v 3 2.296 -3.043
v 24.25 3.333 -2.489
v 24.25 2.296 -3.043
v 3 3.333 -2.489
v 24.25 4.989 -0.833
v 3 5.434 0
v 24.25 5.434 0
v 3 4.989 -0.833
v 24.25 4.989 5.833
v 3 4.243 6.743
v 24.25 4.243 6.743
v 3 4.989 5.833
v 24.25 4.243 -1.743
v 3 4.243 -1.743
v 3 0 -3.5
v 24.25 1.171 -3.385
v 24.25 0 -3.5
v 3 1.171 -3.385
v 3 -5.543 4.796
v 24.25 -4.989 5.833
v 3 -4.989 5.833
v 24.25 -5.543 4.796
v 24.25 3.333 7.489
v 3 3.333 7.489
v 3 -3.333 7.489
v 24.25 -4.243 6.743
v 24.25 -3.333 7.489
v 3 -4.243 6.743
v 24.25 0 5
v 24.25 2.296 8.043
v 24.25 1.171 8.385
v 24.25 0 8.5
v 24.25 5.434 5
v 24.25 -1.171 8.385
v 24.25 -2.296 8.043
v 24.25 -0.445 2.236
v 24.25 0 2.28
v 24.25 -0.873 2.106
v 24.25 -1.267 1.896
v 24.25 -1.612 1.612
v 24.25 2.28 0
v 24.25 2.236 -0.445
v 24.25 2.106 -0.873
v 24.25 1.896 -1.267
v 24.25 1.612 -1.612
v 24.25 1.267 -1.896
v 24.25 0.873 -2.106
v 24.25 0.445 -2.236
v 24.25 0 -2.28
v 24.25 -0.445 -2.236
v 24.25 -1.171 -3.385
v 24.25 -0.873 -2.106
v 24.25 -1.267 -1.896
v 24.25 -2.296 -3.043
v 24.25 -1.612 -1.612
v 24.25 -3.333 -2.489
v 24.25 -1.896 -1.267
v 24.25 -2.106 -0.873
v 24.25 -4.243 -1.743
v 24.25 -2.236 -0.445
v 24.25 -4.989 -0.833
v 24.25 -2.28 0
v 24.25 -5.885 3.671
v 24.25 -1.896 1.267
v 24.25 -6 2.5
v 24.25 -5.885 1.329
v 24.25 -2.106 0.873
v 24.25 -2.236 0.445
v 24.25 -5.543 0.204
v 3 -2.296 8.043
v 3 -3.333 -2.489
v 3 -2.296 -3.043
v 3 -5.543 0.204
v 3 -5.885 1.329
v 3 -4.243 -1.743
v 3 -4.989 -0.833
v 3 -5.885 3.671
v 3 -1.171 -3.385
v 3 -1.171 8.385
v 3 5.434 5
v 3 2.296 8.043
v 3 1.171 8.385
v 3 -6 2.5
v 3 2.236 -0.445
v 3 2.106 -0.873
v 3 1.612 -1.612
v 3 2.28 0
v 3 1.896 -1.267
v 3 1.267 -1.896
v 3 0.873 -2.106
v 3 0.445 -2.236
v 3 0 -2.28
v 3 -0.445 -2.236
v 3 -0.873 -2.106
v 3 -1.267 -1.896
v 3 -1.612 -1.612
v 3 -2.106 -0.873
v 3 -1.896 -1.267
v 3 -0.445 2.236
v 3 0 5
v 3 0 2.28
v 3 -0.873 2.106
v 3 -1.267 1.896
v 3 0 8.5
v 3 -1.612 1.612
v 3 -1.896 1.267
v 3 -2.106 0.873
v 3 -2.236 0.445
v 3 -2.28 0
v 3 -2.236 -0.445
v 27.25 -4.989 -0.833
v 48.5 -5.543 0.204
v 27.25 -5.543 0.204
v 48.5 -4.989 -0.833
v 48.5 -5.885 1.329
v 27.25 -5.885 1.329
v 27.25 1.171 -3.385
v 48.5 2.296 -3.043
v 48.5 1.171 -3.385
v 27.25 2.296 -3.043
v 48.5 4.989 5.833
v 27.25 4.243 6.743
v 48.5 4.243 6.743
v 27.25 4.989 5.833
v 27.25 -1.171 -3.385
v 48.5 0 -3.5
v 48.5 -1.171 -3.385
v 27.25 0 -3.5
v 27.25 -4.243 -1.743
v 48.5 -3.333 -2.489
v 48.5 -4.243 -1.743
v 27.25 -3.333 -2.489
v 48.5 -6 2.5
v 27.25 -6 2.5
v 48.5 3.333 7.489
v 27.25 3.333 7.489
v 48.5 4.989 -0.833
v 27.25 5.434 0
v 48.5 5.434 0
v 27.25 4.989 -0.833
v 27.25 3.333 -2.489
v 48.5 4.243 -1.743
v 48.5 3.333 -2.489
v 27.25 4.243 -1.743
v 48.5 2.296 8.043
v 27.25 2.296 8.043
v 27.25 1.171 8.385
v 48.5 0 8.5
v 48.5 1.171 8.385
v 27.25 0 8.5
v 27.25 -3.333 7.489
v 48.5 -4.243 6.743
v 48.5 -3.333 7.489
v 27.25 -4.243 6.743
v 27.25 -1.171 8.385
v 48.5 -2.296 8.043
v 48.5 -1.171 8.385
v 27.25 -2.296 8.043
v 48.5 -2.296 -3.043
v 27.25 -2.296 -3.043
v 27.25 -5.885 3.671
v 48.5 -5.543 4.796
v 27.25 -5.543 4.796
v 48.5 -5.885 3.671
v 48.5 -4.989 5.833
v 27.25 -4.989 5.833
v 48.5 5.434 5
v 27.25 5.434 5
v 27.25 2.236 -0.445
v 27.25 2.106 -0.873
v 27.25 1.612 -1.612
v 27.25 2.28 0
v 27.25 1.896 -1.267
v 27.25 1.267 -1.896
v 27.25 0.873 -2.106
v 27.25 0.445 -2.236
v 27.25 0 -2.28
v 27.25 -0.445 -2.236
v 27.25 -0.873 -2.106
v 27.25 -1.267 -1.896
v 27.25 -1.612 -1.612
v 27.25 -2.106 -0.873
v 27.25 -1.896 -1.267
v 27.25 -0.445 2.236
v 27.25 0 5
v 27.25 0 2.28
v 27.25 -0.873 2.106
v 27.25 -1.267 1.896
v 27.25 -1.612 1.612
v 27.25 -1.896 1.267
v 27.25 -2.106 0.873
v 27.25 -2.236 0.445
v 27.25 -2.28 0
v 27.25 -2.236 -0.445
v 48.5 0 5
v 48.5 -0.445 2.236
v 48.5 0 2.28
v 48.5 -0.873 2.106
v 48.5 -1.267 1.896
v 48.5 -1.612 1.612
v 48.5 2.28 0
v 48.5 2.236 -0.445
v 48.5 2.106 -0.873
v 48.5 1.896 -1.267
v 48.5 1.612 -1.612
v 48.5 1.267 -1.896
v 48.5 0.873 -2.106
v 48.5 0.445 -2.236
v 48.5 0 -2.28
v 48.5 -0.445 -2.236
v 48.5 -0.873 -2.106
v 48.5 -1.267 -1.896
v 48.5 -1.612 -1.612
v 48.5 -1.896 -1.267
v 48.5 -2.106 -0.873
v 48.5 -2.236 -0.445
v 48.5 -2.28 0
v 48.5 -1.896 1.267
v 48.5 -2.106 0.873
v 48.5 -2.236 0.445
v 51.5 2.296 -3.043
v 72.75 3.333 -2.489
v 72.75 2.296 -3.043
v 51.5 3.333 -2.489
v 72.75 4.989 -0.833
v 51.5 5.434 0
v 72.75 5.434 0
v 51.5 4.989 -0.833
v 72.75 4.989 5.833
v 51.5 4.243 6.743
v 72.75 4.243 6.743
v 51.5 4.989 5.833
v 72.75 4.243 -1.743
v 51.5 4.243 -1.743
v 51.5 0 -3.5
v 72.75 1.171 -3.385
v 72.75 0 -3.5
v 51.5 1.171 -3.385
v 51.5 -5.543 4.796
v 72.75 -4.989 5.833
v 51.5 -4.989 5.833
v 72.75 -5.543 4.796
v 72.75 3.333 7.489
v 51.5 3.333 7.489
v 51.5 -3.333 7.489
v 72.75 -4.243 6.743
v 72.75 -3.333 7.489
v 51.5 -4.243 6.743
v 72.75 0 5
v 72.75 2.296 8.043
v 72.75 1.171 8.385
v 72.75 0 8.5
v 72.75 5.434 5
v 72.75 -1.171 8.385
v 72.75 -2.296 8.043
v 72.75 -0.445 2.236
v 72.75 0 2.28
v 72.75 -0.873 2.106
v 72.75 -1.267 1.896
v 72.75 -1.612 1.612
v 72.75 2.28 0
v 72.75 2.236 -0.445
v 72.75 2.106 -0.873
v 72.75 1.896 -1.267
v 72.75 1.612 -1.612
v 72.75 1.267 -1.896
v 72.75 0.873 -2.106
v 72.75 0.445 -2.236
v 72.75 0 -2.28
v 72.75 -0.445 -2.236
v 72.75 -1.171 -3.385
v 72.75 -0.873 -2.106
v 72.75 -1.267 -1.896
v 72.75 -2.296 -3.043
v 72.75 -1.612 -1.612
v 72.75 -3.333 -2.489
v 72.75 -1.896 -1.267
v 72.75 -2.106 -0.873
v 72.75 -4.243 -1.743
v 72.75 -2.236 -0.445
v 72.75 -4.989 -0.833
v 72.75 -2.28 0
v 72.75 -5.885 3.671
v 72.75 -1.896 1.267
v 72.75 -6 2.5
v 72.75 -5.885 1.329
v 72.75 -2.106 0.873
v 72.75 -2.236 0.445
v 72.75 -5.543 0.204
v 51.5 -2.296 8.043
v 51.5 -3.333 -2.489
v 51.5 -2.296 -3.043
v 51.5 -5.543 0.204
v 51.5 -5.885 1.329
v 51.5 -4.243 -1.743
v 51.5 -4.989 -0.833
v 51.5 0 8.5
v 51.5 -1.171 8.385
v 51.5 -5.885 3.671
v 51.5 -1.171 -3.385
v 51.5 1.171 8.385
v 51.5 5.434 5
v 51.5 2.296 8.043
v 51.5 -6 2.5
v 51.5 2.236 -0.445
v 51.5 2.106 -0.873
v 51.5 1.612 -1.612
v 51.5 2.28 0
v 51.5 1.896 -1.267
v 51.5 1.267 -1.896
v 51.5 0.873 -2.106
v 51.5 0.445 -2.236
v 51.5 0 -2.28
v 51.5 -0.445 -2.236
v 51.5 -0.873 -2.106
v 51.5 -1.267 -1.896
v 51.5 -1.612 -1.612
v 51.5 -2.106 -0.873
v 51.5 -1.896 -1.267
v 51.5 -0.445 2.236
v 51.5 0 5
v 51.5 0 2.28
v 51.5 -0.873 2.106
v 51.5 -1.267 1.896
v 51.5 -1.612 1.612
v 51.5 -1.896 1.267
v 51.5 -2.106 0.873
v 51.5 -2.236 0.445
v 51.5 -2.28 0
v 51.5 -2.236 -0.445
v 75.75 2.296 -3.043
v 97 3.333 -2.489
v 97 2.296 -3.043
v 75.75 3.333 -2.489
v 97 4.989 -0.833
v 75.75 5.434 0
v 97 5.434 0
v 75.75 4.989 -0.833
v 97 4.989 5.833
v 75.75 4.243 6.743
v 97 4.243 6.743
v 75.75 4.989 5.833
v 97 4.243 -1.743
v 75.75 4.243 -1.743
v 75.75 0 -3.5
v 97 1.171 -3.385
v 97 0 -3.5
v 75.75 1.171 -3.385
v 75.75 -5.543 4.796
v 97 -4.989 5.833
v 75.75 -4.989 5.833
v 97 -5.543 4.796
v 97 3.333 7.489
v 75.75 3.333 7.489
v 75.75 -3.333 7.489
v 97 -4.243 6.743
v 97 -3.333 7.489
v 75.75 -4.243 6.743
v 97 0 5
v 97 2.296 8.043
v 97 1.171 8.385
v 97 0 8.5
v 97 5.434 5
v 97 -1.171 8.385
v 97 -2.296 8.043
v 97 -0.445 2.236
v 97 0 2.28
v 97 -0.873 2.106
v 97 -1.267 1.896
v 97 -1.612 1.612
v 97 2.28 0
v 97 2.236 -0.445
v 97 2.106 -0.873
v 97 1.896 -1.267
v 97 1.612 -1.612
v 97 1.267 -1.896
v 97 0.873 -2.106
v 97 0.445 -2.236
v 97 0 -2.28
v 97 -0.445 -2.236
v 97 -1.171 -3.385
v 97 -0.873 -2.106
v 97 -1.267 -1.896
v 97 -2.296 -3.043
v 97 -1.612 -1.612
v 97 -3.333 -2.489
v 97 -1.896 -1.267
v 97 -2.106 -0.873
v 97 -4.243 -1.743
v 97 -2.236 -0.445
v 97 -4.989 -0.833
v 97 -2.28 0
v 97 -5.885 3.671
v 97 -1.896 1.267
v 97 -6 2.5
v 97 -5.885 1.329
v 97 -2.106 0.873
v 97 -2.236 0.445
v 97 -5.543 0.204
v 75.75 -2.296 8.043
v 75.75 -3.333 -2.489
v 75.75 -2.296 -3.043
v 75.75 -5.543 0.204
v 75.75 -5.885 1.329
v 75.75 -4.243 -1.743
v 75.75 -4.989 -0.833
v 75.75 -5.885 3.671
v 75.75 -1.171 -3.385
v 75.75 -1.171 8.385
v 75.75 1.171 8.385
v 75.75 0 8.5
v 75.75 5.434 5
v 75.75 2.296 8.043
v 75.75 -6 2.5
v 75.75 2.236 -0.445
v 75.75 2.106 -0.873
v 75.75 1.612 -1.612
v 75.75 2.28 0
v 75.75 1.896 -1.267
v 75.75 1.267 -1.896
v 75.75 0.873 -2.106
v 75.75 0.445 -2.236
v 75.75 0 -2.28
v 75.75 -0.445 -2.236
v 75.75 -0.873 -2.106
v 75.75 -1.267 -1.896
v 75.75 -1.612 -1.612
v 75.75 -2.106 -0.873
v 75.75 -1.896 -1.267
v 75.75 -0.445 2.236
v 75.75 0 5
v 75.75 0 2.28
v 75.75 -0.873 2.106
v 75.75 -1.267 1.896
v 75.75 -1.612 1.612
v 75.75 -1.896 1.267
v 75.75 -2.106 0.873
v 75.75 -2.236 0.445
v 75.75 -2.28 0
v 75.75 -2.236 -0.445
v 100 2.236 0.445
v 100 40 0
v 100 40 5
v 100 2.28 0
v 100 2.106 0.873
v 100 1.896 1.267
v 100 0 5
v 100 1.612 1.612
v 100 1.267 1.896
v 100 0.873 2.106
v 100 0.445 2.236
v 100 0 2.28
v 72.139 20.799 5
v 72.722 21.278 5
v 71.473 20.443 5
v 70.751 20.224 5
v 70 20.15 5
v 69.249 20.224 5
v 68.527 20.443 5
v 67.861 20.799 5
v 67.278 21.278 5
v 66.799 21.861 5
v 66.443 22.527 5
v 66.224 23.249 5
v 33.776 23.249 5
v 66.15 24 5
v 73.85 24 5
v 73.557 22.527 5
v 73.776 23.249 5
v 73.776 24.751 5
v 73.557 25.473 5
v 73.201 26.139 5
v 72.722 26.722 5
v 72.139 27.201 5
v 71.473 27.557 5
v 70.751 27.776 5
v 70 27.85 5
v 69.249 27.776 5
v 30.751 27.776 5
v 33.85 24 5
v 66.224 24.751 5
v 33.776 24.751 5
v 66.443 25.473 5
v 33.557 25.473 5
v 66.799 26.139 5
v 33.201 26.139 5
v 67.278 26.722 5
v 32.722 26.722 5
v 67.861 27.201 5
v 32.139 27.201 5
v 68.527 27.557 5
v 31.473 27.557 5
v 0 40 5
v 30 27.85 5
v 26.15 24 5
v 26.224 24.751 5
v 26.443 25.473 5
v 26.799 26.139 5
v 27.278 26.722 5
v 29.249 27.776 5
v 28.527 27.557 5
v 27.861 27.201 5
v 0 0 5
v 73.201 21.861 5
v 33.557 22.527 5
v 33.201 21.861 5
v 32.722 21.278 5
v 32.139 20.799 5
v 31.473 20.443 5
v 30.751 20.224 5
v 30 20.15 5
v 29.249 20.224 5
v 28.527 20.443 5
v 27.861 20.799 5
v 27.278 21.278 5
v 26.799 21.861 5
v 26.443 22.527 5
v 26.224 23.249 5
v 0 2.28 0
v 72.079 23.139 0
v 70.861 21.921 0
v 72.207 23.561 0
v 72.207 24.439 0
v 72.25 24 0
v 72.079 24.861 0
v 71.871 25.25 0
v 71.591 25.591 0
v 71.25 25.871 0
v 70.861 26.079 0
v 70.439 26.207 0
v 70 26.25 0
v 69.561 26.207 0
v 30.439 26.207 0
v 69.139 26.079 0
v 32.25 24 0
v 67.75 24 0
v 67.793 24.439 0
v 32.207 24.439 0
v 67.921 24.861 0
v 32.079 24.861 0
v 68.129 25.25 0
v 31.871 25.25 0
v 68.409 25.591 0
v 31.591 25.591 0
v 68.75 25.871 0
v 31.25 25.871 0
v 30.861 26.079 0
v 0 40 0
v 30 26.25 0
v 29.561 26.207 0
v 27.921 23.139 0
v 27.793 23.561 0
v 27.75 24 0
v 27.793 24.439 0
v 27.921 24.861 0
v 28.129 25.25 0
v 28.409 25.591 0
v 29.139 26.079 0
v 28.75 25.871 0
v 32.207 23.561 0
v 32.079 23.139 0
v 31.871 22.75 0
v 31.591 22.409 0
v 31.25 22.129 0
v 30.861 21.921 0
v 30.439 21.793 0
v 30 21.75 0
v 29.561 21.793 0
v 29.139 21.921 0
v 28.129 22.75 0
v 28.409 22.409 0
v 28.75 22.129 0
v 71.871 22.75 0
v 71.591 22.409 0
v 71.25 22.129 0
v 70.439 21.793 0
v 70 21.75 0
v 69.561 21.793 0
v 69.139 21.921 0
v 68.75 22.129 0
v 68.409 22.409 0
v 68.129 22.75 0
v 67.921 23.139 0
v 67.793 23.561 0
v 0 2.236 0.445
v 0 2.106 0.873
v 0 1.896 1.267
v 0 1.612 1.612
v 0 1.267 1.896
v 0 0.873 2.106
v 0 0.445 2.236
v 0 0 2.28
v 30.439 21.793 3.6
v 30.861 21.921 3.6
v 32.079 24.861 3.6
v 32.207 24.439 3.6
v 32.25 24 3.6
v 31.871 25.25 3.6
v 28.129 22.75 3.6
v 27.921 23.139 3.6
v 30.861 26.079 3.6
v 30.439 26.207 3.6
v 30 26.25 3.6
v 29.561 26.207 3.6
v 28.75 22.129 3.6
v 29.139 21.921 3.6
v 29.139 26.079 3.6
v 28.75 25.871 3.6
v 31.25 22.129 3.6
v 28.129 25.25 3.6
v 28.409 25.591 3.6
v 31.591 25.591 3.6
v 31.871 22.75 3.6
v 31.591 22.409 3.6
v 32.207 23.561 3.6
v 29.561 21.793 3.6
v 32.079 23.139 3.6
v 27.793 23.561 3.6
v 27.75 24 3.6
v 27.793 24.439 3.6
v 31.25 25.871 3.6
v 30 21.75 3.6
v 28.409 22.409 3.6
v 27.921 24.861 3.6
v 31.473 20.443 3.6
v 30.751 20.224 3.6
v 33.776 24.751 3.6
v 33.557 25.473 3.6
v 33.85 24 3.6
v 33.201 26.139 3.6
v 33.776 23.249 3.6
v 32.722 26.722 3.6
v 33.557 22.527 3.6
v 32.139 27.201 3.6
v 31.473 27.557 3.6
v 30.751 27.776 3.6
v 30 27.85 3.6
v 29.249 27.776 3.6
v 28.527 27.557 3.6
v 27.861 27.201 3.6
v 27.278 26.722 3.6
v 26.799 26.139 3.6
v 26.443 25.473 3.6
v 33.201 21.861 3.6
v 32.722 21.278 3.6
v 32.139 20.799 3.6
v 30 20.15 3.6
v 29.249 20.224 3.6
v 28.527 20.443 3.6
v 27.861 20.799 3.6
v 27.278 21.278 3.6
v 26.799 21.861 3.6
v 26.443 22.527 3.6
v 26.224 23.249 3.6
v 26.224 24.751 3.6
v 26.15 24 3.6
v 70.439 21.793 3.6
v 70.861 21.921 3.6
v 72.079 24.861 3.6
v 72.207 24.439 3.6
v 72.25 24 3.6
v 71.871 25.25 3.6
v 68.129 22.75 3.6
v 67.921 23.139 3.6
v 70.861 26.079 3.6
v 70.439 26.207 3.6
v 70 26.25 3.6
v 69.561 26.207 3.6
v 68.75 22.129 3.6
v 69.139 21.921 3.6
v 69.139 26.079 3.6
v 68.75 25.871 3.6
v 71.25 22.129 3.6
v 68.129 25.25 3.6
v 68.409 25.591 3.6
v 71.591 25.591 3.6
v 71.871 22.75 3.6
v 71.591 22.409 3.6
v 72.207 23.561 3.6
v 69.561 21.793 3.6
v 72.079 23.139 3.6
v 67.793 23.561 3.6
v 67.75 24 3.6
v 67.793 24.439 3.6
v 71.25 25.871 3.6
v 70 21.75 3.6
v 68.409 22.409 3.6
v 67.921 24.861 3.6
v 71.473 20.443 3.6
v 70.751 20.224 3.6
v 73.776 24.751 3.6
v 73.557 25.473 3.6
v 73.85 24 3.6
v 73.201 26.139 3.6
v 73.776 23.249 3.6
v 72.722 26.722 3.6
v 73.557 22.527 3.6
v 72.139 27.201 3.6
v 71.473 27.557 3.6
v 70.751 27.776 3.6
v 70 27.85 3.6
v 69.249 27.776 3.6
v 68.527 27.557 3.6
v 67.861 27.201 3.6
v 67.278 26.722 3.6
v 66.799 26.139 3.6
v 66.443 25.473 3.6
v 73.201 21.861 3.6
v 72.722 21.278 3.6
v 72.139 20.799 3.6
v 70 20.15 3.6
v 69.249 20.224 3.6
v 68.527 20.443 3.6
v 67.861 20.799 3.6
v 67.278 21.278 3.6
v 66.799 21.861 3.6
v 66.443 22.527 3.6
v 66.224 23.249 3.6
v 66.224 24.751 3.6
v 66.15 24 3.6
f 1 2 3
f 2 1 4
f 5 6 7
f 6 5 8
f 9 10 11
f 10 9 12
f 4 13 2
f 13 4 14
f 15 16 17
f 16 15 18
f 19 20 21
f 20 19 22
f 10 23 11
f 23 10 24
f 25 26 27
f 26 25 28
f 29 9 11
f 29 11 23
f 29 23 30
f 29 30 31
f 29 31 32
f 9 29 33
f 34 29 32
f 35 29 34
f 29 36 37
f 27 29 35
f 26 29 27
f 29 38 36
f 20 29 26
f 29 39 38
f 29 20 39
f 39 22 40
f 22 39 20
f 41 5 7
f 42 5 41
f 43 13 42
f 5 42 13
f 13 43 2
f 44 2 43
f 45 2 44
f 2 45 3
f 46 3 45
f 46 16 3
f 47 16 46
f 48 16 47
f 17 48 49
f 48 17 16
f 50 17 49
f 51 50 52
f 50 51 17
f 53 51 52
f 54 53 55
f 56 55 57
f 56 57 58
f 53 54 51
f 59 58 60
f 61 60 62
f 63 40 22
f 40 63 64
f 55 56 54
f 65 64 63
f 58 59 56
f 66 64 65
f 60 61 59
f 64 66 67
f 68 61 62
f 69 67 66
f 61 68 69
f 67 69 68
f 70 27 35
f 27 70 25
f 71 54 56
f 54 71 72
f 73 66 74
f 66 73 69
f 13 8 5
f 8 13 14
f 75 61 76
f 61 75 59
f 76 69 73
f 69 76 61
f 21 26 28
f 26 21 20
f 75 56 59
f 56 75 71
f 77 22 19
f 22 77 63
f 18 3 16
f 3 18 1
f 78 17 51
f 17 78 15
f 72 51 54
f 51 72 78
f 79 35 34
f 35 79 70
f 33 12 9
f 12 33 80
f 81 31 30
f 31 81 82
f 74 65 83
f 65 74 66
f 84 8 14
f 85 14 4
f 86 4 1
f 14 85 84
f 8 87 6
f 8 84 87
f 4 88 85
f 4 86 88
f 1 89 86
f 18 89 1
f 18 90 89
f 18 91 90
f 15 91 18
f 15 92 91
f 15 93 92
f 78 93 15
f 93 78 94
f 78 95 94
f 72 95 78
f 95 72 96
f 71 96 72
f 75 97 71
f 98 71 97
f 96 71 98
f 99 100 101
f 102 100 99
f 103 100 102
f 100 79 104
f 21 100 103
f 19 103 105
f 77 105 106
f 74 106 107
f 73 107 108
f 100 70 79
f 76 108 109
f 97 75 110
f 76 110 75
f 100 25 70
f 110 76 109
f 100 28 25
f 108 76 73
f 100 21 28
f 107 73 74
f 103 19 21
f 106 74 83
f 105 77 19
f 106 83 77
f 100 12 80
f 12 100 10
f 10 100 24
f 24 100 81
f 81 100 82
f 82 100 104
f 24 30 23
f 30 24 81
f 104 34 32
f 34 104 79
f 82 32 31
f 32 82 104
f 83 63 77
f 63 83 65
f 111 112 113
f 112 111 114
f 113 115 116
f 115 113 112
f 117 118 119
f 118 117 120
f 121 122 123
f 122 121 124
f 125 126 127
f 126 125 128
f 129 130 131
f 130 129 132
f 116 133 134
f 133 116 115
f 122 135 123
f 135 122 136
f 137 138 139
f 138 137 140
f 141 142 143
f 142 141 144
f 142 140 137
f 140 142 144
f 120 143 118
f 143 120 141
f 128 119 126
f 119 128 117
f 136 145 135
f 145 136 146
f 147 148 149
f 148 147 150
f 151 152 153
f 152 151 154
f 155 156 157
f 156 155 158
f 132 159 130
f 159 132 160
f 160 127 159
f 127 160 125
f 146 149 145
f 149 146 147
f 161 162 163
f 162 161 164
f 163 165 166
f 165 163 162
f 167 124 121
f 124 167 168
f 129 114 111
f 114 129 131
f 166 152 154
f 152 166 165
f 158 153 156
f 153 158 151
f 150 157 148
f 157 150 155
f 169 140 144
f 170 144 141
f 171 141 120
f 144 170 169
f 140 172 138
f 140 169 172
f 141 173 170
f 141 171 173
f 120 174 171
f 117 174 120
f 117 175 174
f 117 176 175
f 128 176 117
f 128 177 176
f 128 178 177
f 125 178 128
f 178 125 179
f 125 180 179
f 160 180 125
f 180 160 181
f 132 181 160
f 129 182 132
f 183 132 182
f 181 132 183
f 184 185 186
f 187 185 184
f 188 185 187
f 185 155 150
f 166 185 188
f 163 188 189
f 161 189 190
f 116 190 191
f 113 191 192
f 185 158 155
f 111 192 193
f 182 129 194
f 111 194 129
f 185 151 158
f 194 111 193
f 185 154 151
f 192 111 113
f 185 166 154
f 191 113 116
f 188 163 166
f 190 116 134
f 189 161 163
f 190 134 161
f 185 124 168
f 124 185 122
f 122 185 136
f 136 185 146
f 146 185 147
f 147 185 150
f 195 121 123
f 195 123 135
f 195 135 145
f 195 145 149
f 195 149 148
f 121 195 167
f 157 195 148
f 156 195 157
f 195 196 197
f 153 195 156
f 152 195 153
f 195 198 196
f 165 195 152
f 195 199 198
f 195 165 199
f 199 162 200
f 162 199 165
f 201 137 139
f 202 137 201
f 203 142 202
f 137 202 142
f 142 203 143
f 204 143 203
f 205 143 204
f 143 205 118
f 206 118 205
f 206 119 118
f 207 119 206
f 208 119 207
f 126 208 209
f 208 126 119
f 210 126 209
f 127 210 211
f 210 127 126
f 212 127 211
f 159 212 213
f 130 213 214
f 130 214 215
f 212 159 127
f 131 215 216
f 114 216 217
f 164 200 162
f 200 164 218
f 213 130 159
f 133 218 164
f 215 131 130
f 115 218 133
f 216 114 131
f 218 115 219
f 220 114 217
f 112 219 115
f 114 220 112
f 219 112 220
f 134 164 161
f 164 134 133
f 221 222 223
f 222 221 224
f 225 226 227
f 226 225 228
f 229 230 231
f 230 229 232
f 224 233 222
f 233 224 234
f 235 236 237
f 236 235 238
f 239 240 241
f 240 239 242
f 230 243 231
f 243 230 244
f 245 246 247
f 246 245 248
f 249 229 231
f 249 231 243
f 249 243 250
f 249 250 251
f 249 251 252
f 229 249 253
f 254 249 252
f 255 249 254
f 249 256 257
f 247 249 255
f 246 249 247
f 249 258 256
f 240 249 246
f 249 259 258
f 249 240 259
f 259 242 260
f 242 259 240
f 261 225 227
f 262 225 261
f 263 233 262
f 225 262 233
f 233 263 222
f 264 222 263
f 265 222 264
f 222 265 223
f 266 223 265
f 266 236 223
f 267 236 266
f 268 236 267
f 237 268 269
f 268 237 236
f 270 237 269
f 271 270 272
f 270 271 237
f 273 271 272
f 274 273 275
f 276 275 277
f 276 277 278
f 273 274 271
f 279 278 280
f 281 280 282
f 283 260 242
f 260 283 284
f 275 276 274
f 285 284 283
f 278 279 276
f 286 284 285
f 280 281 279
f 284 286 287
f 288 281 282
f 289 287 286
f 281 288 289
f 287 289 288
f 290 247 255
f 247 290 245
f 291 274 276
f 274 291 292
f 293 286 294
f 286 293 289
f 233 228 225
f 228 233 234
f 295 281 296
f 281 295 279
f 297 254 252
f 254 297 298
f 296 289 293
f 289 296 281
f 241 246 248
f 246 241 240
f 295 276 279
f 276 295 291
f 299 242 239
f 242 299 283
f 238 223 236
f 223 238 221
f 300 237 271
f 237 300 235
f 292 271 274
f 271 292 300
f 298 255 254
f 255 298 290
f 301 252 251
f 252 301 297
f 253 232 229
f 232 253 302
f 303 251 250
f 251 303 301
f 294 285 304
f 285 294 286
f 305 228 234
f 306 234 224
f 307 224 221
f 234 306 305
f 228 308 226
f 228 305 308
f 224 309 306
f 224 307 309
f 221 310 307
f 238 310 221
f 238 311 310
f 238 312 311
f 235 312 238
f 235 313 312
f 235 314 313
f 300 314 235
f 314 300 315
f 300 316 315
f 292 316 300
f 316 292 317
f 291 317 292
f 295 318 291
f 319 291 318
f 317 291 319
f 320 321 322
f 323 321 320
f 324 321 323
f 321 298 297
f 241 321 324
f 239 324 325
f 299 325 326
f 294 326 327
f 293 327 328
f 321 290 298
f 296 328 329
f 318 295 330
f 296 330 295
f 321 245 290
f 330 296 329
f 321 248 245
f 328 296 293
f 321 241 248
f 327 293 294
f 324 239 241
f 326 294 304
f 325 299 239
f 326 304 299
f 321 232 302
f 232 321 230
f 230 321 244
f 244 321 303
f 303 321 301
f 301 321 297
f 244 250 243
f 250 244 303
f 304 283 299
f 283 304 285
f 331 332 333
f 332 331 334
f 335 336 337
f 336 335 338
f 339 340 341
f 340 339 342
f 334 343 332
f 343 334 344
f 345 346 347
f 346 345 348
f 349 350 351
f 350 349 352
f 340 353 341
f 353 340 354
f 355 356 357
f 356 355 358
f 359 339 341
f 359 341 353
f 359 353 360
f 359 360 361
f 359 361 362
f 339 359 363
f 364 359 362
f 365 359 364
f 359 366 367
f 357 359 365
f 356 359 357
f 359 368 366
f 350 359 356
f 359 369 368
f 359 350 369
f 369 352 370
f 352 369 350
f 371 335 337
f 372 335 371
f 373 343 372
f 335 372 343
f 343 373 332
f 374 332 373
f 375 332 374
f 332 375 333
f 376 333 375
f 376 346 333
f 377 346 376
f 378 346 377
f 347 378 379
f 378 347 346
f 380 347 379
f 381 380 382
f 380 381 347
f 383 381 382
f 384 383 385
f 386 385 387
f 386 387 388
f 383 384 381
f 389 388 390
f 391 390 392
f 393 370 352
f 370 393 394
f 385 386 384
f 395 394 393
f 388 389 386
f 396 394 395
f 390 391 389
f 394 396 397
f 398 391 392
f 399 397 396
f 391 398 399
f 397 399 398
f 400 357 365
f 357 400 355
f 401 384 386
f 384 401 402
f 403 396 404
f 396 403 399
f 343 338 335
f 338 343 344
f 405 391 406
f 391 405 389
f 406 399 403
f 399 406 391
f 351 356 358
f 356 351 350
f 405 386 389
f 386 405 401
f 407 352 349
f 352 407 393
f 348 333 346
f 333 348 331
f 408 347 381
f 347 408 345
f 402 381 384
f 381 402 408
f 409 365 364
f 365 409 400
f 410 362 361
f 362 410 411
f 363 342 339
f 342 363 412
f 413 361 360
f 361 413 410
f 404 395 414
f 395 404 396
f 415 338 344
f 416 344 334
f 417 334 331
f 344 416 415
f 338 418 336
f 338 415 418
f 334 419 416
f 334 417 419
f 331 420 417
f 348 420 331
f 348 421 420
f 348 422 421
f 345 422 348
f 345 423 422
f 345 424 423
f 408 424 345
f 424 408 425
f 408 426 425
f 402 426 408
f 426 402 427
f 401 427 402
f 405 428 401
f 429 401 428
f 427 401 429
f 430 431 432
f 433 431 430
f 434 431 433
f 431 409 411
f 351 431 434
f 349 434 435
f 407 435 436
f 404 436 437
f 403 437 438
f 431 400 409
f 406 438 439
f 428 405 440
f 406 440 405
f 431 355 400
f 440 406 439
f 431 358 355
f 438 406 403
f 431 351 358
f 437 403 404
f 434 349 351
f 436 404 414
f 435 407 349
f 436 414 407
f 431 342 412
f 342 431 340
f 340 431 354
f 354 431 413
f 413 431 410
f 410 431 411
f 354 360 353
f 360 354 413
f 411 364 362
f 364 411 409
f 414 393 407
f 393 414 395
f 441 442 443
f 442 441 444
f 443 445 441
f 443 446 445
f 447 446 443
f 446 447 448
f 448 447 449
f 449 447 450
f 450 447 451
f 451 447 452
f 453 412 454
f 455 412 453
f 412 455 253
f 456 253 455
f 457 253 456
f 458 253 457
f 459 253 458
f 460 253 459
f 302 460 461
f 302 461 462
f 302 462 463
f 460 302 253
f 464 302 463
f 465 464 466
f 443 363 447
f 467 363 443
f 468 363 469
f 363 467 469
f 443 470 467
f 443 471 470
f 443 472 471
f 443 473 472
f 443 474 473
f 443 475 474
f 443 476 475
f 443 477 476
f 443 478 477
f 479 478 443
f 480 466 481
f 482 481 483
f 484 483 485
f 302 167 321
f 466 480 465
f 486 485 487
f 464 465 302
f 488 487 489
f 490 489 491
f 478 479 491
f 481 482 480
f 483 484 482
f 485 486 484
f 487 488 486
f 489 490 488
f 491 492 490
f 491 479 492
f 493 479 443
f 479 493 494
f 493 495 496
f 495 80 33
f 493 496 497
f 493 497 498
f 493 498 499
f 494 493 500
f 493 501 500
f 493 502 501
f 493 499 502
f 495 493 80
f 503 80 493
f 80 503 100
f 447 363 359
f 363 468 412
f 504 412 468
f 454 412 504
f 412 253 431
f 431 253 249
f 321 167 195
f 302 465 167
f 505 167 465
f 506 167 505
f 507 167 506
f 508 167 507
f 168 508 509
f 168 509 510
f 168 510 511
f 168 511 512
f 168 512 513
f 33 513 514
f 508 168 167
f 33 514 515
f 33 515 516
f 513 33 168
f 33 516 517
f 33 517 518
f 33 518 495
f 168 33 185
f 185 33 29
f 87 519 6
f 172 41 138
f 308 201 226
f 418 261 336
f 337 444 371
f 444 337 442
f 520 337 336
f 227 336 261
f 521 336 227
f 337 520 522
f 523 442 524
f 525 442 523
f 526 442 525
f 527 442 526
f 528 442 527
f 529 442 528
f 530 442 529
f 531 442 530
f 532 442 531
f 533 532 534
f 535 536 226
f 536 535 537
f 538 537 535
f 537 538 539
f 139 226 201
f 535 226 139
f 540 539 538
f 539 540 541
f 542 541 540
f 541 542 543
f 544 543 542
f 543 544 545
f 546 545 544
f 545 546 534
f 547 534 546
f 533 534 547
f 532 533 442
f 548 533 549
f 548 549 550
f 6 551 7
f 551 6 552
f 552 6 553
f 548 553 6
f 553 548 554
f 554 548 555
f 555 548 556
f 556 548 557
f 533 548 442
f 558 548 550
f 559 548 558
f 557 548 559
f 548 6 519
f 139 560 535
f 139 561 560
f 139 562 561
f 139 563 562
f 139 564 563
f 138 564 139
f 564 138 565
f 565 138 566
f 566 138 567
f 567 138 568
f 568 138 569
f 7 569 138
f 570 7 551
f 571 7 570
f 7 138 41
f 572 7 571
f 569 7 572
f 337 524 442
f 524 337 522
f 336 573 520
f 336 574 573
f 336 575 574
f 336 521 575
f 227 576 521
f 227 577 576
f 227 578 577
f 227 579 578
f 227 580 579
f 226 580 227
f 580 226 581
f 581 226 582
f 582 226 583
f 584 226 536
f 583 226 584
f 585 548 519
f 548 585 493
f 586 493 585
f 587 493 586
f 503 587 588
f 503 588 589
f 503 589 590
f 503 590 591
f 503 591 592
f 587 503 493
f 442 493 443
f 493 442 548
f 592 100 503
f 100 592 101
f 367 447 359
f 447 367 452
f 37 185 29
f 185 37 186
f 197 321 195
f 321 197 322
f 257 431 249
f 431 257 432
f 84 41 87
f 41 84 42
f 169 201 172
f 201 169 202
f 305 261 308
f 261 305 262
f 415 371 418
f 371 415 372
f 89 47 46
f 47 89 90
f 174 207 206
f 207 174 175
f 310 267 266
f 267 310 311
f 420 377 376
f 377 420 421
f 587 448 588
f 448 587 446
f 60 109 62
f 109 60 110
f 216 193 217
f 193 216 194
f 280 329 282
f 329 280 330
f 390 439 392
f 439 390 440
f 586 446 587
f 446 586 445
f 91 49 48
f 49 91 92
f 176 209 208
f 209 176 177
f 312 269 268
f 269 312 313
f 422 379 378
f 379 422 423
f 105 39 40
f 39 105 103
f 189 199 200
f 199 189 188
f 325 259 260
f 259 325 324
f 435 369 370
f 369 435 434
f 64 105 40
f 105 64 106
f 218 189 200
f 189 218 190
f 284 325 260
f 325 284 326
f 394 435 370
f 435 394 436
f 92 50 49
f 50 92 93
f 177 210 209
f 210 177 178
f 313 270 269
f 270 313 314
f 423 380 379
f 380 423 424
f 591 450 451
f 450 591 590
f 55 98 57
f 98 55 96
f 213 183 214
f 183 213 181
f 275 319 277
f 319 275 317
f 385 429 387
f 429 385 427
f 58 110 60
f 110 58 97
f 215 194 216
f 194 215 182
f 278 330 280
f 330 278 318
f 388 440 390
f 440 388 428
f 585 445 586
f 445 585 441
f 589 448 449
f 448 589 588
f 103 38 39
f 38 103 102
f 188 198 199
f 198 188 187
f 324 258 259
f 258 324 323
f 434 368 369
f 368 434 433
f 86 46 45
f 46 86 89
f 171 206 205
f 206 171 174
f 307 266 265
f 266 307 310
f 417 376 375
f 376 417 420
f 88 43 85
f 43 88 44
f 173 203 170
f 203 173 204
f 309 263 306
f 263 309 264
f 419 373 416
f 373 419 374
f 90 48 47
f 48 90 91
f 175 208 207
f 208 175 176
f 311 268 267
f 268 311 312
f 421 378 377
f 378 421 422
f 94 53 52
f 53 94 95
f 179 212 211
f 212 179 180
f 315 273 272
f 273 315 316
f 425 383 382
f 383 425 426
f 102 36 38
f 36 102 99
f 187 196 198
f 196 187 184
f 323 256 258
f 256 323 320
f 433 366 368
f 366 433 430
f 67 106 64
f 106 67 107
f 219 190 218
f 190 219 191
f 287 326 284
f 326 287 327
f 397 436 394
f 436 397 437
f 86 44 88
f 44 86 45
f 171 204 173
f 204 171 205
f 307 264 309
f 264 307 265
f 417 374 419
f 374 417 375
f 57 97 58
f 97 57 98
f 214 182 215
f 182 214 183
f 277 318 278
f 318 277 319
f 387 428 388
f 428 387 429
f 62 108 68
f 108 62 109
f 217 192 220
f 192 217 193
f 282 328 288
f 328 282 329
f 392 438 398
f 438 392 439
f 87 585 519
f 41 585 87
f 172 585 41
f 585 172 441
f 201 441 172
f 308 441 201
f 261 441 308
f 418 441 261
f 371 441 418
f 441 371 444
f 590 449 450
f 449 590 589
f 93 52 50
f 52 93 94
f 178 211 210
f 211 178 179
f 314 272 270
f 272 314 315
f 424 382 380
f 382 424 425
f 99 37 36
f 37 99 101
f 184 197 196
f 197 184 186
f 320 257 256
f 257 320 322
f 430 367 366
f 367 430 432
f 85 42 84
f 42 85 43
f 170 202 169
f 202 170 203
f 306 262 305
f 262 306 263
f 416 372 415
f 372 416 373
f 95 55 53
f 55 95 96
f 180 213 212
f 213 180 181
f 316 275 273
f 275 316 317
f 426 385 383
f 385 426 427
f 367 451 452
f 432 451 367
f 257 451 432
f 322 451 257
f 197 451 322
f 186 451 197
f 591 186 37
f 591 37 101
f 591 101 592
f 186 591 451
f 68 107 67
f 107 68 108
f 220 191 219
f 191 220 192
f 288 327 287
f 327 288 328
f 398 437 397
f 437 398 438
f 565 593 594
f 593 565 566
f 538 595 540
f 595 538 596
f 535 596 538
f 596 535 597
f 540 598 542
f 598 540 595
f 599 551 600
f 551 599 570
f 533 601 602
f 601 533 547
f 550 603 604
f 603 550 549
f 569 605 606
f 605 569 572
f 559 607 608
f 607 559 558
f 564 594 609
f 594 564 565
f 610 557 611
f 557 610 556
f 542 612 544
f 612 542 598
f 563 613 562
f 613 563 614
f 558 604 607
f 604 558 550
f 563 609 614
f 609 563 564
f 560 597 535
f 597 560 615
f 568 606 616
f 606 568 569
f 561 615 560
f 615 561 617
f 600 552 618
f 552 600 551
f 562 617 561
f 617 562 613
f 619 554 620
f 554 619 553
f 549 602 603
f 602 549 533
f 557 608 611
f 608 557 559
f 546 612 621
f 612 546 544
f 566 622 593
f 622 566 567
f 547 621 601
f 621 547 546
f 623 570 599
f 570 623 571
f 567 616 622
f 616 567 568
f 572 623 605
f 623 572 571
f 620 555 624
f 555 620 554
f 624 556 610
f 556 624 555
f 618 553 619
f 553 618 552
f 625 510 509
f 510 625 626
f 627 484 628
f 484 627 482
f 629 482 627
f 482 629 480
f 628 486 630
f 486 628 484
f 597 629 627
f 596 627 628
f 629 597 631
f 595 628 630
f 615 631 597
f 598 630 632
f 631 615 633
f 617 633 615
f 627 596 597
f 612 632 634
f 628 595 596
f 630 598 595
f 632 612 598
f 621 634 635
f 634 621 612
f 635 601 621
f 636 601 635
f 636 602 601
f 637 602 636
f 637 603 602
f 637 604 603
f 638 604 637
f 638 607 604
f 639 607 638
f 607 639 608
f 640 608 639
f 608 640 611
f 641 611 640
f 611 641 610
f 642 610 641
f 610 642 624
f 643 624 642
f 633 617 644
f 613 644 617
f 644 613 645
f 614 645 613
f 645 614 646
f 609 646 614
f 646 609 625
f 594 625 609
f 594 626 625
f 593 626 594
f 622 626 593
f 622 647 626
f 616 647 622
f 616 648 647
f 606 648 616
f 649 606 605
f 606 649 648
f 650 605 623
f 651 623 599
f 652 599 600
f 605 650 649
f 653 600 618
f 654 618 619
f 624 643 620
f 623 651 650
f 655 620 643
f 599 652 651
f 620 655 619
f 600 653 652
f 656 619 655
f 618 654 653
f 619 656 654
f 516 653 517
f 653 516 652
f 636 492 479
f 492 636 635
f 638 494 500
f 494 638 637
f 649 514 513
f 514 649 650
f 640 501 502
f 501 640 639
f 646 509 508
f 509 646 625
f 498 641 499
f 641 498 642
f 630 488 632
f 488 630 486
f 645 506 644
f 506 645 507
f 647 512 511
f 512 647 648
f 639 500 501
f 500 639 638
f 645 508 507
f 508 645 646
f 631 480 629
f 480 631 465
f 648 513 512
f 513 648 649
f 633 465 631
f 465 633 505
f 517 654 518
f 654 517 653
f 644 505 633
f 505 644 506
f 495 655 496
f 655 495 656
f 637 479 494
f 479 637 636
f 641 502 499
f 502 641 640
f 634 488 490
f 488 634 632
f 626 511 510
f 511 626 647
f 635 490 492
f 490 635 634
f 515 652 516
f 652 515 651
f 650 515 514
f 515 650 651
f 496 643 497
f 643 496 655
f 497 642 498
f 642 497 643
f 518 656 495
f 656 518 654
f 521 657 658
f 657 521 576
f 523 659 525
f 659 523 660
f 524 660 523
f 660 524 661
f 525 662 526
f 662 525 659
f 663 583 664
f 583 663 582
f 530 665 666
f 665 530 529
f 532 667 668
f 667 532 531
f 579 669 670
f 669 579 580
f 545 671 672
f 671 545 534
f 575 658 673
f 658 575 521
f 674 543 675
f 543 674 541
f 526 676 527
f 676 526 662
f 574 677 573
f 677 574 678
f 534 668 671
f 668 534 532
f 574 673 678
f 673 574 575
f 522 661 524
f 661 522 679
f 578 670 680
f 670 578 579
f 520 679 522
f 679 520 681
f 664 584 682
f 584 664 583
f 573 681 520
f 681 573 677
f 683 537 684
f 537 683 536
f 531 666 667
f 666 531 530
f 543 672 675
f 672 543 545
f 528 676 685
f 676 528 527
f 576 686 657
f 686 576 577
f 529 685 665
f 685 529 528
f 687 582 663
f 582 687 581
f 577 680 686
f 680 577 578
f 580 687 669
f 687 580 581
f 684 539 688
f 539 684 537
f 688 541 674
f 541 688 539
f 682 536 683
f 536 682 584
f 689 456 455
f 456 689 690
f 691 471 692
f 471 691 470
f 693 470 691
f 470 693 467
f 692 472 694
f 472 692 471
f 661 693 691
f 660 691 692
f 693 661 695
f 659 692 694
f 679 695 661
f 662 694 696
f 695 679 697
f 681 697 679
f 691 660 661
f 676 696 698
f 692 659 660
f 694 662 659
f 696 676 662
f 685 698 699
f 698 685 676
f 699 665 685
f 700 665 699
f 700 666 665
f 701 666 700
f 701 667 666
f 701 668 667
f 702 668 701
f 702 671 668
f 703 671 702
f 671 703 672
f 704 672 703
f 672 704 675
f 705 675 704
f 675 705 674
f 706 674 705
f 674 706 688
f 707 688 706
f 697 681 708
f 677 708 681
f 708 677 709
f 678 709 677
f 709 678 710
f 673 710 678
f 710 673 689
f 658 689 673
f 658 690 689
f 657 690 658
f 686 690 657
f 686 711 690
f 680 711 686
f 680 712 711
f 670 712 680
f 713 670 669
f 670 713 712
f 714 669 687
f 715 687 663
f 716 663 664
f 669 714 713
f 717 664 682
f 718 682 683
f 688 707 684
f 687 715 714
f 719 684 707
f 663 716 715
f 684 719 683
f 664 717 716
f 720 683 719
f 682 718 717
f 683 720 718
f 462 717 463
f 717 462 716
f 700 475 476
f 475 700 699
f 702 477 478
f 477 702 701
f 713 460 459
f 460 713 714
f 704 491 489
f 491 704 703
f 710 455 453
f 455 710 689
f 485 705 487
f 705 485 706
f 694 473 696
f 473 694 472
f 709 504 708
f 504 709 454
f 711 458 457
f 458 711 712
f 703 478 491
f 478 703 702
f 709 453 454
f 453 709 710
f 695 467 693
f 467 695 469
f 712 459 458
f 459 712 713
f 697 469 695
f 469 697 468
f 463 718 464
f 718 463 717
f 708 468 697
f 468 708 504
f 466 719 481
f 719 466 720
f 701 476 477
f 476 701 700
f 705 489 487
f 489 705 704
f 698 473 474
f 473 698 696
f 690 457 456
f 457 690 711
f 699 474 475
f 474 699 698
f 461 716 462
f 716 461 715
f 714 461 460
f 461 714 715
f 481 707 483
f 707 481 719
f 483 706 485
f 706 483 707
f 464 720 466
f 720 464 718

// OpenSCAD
$fn = 32;

// ----------------------------------------------------------------------
// Hinge leaf: 100 x 46 x 12 mm
// ----------------------------------------------------------------------

// --- parameters (mm) ---
tab_len = 100;            // leaf length, X
tab_w = 40;               // leaf width, Y
tab_t = 5;                // leaf thickness
ring_d = 12;              // knuckle diameter
ring_w = 21.25;           // knuckle width
knuckle_n = 4;            // number of knuckles
pin_d = 4.56;             // pin bore
gap = 3;                  // gap between the knuckles
screw_d = 4.5;            // screw clearance
cs_d = 7.7;               // countersink diameter
cs_h = 1.4;               // countersink depth

module leaf() {
  cube([tab_len, tab_w, tab_t]);
}

module knuckles() {
  /* barrels sit on the leaf edge, the pin axis at half the leaf thickness */
  for (i = [0 : knuckle_n - 1])
    translate([gap + i * (ring_w + gap), 0, tab_t * 0.5])
      rotate([0, 90, 0]) cylinder(h = ring_w, d = ring_d);
}

difference() {
  union() {
    leaf();
    knuckles();
  }
  rotate([0, 90, 0]) translate([0, 0, -1])
    cylinder(h = tab_len + 2, d = pin_d);
  translate([30, tab_w * 0.6, -1]) cylinder(h = tab_t + 2, d = screw_d);
  translate([30, tab_w * 0.6, tab_t - cs_h]) cylinder(h = cs_h + 0.5, d = cs_d);
  translate([70, tab_w * 0.6, -1]) cylinder(h = tab_t + 2, d = screw_d);
  translate([70, tab_w * 0.6, tab_t - cs_h]) cylinder(h = cs_h + 0.5, d = cs_d);
}
